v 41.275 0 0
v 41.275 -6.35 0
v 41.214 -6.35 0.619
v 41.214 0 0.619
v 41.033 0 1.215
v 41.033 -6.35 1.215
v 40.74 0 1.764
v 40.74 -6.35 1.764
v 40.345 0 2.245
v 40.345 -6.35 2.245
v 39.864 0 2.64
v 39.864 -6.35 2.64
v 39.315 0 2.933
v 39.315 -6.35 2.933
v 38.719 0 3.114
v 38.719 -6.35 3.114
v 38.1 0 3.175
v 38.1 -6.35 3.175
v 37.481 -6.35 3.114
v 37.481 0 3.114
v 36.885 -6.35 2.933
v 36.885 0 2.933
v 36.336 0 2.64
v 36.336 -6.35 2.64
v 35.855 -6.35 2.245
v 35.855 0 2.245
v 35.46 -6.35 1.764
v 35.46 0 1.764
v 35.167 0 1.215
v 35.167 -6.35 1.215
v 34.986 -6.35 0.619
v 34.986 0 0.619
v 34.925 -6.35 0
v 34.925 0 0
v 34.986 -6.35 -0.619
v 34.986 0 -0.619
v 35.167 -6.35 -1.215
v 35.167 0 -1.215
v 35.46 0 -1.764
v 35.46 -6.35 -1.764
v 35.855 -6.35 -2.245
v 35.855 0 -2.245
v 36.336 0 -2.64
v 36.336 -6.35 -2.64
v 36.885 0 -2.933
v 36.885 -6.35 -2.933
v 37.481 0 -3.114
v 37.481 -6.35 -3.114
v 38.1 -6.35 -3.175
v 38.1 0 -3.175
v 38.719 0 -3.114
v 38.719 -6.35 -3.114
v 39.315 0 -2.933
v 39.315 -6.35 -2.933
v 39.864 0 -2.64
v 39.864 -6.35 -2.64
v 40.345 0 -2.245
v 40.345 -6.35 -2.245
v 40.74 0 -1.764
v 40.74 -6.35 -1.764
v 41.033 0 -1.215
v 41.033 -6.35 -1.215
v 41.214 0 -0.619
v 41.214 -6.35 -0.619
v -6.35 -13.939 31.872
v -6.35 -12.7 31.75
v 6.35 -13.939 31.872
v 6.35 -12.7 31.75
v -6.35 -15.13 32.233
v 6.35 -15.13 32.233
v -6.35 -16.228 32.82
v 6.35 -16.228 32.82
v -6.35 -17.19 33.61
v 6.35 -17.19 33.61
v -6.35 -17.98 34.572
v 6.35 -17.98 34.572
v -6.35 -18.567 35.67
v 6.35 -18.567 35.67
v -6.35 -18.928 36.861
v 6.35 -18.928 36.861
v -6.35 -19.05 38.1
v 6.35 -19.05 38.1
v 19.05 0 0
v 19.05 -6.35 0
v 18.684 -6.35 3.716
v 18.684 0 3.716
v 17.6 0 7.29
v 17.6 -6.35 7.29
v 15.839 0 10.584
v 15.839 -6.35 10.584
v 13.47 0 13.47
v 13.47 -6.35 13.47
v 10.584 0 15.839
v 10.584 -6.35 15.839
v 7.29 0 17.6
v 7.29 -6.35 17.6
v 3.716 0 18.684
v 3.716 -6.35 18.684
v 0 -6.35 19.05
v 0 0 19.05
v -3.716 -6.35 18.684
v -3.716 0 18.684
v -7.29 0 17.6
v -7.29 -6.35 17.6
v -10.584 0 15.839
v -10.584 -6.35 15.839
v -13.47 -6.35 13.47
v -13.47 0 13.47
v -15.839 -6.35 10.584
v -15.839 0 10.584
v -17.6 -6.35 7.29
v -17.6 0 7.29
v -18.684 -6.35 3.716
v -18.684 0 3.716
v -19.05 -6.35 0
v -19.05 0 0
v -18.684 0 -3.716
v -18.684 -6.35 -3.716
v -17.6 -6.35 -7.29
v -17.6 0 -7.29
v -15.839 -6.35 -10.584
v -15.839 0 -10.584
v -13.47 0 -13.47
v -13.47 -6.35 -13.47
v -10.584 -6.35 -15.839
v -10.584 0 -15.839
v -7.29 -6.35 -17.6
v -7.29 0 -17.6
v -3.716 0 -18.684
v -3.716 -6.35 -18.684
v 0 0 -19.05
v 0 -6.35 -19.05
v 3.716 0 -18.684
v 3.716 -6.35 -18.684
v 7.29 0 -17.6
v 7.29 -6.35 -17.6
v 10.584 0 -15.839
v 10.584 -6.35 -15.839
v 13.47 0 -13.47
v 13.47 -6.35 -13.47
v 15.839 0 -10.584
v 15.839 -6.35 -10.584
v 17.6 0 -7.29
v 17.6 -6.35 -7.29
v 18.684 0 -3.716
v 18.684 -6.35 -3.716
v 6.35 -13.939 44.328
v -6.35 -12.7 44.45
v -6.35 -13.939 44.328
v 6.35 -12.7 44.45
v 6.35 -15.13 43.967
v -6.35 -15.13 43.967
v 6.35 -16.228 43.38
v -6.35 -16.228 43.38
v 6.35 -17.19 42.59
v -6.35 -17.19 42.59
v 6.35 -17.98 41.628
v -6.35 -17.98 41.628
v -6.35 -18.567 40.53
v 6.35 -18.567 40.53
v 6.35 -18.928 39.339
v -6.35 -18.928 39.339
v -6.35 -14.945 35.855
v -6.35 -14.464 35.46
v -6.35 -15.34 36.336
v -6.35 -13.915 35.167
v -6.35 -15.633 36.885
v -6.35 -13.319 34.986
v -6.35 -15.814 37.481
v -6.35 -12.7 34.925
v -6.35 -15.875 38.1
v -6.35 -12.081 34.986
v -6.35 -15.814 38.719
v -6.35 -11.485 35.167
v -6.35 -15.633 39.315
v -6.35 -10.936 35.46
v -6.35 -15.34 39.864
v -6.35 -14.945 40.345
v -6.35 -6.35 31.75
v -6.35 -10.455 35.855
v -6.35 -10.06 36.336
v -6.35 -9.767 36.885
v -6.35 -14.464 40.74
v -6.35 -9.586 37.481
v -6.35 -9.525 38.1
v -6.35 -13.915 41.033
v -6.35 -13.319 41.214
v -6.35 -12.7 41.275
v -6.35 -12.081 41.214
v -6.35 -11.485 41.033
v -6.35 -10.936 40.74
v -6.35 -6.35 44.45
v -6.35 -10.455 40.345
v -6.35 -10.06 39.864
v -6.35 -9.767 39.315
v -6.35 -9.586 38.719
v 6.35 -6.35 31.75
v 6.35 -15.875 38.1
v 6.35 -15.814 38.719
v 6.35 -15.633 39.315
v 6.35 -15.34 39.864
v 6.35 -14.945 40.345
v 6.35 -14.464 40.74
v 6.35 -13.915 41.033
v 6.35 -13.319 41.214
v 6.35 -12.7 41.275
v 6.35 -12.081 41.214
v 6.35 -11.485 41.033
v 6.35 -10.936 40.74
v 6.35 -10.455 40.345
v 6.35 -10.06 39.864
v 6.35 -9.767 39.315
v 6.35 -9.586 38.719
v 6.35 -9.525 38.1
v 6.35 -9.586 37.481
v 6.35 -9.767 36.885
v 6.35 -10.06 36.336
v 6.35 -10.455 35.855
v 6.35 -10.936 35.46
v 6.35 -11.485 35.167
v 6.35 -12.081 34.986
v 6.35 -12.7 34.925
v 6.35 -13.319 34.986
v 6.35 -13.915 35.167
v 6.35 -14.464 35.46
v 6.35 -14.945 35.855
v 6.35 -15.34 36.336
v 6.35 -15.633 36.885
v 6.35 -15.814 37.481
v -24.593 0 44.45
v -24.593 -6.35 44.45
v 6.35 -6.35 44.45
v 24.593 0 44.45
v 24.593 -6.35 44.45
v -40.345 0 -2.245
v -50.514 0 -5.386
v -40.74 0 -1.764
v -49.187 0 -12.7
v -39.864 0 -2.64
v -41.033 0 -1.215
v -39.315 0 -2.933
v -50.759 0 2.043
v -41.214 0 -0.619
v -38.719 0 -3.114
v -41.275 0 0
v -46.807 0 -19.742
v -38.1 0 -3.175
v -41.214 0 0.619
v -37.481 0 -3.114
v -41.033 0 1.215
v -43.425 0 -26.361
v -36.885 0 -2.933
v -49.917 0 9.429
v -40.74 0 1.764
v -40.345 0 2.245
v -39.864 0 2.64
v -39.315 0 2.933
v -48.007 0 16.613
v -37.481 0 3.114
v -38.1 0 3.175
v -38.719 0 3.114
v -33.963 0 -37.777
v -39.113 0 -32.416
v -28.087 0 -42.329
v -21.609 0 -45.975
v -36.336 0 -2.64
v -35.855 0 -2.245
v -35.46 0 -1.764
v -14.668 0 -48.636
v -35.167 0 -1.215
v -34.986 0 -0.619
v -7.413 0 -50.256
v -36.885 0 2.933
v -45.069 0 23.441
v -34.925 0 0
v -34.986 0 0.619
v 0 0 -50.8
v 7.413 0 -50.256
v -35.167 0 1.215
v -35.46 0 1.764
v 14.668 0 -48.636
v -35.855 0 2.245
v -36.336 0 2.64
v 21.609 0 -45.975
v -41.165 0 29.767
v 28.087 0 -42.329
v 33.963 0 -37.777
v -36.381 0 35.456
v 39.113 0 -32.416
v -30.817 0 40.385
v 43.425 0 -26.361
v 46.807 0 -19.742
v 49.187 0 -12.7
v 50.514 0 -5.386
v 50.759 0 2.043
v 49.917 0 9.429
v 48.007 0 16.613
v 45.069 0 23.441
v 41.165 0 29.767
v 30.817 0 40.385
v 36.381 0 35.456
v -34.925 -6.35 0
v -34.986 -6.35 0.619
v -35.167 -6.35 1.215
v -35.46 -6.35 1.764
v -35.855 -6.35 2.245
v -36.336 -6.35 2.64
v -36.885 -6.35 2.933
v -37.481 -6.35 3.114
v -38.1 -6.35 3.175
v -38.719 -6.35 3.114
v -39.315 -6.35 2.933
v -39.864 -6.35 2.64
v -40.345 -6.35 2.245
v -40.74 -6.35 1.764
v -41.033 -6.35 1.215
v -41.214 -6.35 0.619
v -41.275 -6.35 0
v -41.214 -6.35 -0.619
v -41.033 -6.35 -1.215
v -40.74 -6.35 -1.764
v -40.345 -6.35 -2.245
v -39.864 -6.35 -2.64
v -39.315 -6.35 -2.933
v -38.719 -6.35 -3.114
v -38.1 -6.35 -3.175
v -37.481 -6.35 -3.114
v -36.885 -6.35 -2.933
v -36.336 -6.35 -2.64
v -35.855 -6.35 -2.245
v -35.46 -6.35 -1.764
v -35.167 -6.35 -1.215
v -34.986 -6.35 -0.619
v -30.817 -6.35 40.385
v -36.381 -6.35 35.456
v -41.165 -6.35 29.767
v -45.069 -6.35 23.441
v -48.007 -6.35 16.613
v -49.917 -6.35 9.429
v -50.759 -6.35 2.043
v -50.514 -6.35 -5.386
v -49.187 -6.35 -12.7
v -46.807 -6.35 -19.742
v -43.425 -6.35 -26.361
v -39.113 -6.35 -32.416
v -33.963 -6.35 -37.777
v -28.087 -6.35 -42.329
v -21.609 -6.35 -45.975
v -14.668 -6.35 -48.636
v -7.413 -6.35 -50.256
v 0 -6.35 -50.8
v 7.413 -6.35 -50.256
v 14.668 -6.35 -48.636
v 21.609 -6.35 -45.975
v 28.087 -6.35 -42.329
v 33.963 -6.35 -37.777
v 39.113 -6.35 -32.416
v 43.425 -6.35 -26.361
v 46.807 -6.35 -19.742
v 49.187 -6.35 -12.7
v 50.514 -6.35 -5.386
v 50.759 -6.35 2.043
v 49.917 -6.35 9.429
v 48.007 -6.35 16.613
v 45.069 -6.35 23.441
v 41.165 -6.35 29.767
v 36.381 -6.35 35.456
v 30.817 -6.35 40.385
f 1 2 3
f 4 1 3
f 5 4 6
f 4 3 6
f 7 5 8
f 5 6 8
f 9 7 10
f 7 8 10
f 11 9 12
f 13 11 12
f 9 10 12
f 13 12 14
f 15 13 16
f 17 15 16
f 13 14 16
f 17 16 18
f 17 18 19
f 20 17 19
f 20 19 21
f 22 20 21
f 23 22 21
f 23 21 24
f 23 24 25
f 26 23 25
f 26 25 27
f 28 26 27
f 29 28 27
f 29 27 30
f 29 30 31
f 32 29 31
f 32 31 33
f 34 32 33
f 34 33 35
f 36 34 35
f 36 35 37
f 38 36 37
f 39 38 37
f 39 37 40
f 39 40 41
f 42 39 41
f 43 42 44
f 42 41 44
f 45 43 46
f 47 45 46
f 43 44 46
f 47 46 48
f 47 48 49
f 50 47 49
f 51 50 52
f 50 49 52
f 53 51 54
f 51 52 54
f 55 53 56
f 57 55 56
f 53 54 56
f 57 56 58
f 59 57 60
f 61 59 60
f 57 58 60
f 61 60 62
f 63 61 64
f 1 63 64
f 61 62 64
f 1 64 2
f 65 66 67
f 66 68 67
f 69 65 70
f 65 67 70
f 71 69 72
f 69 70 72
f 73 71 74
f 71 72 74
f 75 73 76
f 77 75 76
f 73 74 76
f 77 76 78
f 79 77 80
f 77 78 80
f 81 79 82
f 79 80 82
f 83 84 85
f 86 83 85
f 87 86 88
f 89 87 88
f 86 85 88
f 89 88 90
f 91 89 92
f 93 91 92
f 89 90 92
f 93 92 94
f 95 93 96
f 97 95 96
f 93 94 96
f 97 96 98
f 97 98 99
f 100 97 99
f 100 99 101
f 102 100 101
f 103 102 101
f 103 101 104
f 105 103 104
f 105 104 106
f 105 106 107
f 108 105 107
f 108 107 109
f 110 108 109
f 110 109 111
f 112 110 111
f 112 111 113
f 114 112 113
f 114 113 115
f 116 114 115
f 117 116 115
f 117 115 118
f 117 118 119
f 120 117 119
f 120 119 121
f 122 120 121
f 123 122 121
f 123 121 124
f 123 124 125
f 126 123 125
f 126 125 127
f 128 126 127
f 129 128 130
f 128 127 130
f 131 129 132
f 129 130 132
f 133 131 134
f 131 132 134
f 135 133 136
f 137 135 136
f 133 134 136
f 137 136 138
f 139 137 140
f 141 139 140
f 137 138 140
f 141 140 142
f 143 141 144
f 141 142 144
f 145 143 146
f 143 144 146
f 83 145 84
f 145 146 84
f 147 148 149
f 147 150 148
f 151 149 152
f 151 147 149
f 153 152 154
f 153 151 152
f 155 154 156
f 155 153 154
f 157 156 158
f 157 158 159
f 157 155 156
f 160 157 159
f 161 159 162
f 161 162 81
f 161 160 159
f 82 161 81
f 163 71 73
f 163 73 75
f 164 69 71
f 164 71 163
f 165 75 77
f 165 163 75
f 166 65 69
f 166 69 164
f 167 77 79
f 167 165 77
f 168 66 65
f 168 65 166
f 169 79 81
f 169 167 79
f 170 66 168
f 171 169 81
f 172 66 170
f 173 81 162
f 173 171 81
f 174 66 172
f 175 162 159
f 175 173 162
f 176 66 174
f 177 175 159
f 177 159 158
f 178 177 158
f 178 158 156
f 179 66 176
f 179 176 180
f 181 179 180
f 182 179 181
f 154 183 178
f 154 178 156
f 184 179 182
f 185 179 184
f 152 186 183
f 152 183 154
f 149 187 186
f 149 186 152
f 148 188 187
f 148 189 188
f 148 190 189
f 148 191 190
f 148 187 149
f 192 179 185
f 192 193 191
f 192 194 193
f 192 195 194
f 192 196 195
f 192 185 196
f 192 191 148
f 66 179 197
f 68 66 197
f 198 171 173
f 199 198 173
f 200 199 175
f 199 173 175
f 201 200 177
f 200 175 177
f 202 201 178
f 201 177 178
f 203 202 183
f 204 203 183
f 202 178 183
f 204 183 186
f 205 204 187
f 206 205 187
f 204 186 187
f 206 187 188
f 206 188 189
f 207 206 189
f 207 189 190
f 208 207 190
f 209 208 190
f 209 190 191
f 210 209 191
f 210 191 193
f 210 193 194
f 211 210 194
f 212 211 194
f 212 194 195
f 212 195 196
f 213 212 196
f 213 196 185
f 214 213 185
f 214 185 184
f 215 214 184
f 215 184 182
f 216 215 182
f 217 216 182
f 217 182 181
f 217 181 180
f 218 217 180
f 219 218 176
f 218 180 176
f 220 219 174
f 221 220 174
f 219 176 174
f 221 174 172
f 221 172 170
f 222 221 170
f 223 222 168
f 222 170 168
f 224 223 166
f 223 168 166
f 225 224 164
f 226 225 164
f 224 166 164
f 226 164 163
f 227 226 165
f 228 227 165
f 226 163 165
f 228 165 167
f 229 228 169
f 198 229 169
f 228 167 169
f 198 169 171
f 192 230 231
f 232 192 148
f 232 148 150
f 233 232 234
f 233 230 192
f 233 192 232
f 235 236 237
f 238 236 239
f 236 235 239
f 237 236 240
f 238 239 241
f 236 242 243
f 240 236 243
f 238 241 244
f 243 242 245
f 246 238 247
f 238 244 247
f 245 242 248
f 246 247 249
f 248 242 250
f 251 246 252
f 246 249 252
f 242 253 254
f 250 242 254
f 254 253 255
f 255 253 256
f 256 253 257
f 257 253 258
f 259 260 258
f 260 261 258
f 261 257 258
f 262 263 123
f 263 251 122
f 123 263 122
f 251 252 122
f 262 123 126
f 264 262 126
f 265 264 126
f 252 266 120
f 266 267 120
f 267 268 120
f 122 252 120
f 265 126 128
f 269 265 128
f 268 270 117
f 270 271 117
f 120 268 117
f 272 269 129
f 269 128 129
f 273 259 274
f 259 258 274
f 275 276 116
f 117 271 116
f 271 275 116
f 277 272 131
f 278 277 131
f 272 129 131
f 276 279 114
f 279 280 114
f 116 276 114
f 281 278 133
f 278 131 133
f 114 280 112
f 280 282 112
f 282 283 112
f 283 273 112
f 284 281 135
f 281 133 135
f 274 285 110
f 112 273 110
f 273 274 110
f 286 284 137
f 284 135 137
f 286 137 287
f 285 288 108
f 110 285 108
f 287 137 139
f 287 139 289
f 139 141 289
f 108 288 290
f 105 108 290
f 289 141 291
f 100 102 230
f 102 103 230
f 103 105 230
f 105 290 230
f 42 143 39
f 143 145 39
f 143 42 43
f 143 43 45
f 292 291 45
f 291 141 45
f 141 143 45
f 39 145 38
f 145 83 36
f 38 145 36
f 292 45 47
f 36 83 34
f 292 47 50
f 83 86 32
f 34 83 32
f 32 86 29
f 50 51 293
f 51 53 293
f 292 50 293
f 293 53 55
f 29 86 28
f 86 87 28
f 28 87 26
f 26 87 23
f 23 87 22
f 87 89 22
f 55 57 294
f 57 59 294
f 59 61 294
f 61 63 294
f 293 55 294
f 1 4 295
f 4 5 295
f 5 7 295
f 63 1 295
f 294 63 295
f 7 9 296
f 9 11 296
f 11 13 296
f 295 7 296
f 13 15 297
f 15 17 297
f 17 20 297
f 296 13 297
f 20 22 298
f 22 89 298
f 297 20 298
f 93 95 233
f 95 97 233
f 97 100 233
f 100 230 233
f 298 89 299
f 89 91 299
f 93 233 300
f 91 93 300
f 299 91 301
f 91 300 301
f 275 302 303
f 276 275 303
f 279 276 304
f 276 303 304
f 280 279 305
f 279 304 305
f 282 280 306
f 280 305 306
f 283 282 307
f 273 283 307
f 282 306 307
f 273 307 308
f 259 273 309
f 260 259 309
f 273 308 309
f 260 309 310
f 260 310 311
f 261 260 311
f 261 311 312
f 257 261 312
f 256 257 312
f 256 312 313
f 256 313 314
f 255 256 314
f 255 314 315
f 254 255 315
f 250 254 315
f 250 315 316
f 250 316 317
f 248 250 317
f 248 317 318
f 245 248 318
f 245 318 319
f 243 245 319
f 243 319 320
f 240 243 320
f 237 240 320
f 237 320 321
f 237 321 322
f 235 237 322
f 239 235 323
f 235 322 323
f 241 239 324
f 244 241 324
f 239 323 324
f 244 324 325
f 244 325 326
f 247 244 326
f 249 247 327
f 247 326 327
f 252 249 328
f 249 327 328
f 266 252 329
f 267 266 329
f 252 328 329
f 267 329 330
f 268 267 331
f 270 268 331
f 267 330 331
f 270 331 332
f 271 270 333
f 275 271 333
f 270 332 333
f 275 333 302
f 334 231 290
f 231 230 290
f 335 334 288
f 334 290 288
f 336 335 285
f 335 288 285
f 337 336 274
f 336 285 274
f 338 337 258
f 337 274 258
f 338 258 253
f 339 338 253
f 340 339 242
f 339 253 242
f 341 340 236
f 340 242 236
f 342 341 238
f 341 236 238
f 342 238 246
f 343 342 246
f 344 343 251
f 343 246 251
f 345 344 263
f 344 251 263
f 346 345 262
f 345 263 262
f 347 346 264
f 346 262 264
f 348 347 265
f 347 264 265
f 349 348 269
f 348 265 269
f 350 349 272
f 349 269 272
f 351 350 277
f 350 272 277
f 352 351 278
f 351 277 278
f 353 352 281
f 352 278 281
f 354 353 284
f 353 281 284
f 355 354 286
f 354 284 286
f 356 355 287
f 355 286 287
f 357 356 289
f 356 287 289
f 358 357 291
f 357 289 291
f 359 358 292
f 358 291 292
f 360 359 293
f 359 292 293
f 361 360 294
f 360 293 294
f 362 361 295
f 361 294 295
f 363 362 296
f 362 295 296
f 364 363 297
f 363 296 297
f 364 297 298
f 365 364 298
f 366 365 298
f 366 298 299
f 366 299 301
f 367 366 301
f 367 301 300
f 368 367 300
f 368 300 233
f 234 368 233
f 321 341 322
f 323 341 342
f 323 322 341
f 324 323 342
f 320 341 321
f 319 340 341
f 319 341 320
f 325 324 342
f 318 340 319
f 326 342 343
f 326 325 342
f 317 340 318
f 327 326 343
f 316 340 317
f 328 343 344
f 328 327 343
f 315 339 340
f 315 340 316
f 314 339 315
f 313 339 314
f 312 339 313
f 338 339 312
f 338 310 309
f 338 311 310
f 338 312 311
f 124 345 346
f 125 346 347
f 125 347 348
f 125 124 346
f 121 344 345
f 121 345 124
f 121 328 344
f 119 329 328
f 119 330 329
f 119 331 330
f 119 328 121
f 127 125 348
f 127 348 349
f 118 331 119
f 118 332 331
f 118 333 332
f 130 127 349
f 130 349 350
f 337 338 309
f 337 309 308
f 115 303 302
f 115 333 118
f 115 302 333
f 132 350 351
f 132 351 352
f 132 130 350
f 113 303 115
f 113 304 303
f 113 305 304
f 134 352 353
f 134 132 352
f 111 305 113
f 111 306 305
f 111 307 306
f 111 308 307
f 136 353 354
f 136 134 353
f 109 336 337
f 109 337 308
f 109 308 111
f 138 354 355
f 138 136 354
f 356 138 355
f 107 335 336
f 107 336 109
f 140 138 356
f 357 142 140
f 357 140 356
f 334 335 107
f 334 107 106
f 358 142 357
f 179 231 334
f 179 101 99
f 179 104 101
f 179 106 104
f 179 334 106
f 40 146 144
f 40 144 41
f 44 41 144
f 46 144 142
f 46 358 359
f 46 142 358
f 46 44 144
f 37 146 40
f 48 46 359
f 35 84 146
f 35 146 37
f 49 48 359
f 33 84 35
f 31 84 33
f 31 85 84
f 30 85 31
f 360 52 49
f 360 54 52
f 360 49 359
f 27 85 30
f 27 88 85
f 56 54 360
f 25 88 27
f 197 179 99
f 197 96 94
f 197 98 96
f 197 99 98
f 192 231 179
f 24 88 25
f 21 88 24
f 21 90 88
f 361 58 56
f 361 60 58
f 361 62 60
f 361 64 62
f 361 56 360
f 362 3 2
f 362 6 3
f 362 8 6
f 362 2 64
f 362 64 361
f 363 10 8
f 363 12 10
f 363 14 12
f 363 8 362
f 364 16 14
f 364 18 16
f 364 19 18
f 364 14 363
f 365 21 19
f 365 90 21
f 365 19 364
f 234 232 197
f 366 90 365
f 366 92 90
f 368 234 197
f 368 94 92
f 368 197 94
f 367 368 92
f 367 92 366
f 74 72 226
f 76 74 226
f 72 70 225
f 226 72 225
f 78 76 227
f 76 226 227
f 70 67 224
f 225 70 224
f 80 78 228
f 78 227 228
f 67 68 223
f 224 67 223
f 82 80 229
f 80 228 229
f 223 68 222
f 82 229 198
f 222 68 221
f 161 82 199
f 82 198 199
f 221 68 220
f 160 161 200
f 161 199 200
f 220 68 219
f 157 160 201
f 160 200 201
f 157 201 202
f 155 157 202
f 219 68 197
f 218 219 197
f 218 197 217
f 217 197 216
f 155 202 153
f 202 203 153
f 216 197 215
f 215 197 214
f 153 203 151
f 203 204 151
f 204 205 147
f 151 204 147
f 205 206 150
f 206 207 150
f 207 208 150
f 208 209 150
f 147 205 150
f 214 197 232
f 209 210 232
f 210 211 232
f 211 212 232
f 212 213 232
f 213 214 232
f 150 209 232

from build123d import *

# Parameters (mm, degrees)
F0_R      = 50.8
F1_DEPTH  = 6.35
F2_W      = 12.7
F2_H      = 12.7
F3_DEPTH  = 12.7
F4_R      = 6.34999
F5_R      = 3.175
F6_DEPTH  = 57.151
F7_R      = 3.175
F7_R_2    = 19.05
F8_DEPTH  = 6.351
F10_DEPTH = 6.351


# Not quite as in the source:
# - a fillet or chamfer is up to 0.001 mm smaller than in the source, because OpenCascade refuses the exact size


with BuildPart() as f1:
    # F0 (on Front) → F1 (new body)
    with BuildSketch(Plane.XZ):
        Circle(F0_R)
    extrude(amount=F1_DEPTH)

    # F2 (on face) → F3 (join)
    with BuildSketch(Plane.XZ.offset(6.35)):
        with Locations((0, 38.1)):
            Rectangle(F2_W, F2_H)
    extrude(amount=F3_DEPTH)

    # F4 (radius 6.35 in the source; OpenCascade refuses exactly that, so slightly less here)
    f4_edges = [f1.edges().sort_by_distance(p)[0] for p in [
        (0, -19.05, 31.75),
        (0, -19.05, 44.45),
    ]]
    fillet(f4_edges, radius=F4_R)

    # F5 (on face) → F6 (cut, through all)
    with BuildSketch(Plane(origin=(-6.35, 0, 0), x_dir=(0, -1, 0), z_dir=(-1, 0, 0))):
        with Locations((12.7, 38.1)):
            Circle(F5_R)
    extrude(amount=-F6_DEPTH, mode=Mode.SUBTRACT)

    # F7 (on face) → F8 (cut, through all)
    with BuildSketch(Plane.XZ.offset(6.35)):
        with Locations((-38.1, 0)):
            Circle(F7_R)
        with Locations((38.1, 0)):
            Circle(F7_R)
        Circle(F7_R_2)
    extrude(amount=-F8_DEPTH, mode=Mode.SUBTRACT)

    # F9 (on face) → F10 (cut, through all)
    with BuildSketch(Plane.XZ.offset(6.35)):
        with BuildLine():
            Line((-24.5934442484, 44.45), (6.35, 44.45))
            Line((6.35, 44.45), (24.5934442484, 44.45))
            ThreePointArc((24.5934442484, 44.45), (0, 50.8), (-24.5934442484, 44.45))
        make_face()
    extrude(amount=-F10_DEPTH, mode=Mode.SUBTRACT)


solid = f1.part
